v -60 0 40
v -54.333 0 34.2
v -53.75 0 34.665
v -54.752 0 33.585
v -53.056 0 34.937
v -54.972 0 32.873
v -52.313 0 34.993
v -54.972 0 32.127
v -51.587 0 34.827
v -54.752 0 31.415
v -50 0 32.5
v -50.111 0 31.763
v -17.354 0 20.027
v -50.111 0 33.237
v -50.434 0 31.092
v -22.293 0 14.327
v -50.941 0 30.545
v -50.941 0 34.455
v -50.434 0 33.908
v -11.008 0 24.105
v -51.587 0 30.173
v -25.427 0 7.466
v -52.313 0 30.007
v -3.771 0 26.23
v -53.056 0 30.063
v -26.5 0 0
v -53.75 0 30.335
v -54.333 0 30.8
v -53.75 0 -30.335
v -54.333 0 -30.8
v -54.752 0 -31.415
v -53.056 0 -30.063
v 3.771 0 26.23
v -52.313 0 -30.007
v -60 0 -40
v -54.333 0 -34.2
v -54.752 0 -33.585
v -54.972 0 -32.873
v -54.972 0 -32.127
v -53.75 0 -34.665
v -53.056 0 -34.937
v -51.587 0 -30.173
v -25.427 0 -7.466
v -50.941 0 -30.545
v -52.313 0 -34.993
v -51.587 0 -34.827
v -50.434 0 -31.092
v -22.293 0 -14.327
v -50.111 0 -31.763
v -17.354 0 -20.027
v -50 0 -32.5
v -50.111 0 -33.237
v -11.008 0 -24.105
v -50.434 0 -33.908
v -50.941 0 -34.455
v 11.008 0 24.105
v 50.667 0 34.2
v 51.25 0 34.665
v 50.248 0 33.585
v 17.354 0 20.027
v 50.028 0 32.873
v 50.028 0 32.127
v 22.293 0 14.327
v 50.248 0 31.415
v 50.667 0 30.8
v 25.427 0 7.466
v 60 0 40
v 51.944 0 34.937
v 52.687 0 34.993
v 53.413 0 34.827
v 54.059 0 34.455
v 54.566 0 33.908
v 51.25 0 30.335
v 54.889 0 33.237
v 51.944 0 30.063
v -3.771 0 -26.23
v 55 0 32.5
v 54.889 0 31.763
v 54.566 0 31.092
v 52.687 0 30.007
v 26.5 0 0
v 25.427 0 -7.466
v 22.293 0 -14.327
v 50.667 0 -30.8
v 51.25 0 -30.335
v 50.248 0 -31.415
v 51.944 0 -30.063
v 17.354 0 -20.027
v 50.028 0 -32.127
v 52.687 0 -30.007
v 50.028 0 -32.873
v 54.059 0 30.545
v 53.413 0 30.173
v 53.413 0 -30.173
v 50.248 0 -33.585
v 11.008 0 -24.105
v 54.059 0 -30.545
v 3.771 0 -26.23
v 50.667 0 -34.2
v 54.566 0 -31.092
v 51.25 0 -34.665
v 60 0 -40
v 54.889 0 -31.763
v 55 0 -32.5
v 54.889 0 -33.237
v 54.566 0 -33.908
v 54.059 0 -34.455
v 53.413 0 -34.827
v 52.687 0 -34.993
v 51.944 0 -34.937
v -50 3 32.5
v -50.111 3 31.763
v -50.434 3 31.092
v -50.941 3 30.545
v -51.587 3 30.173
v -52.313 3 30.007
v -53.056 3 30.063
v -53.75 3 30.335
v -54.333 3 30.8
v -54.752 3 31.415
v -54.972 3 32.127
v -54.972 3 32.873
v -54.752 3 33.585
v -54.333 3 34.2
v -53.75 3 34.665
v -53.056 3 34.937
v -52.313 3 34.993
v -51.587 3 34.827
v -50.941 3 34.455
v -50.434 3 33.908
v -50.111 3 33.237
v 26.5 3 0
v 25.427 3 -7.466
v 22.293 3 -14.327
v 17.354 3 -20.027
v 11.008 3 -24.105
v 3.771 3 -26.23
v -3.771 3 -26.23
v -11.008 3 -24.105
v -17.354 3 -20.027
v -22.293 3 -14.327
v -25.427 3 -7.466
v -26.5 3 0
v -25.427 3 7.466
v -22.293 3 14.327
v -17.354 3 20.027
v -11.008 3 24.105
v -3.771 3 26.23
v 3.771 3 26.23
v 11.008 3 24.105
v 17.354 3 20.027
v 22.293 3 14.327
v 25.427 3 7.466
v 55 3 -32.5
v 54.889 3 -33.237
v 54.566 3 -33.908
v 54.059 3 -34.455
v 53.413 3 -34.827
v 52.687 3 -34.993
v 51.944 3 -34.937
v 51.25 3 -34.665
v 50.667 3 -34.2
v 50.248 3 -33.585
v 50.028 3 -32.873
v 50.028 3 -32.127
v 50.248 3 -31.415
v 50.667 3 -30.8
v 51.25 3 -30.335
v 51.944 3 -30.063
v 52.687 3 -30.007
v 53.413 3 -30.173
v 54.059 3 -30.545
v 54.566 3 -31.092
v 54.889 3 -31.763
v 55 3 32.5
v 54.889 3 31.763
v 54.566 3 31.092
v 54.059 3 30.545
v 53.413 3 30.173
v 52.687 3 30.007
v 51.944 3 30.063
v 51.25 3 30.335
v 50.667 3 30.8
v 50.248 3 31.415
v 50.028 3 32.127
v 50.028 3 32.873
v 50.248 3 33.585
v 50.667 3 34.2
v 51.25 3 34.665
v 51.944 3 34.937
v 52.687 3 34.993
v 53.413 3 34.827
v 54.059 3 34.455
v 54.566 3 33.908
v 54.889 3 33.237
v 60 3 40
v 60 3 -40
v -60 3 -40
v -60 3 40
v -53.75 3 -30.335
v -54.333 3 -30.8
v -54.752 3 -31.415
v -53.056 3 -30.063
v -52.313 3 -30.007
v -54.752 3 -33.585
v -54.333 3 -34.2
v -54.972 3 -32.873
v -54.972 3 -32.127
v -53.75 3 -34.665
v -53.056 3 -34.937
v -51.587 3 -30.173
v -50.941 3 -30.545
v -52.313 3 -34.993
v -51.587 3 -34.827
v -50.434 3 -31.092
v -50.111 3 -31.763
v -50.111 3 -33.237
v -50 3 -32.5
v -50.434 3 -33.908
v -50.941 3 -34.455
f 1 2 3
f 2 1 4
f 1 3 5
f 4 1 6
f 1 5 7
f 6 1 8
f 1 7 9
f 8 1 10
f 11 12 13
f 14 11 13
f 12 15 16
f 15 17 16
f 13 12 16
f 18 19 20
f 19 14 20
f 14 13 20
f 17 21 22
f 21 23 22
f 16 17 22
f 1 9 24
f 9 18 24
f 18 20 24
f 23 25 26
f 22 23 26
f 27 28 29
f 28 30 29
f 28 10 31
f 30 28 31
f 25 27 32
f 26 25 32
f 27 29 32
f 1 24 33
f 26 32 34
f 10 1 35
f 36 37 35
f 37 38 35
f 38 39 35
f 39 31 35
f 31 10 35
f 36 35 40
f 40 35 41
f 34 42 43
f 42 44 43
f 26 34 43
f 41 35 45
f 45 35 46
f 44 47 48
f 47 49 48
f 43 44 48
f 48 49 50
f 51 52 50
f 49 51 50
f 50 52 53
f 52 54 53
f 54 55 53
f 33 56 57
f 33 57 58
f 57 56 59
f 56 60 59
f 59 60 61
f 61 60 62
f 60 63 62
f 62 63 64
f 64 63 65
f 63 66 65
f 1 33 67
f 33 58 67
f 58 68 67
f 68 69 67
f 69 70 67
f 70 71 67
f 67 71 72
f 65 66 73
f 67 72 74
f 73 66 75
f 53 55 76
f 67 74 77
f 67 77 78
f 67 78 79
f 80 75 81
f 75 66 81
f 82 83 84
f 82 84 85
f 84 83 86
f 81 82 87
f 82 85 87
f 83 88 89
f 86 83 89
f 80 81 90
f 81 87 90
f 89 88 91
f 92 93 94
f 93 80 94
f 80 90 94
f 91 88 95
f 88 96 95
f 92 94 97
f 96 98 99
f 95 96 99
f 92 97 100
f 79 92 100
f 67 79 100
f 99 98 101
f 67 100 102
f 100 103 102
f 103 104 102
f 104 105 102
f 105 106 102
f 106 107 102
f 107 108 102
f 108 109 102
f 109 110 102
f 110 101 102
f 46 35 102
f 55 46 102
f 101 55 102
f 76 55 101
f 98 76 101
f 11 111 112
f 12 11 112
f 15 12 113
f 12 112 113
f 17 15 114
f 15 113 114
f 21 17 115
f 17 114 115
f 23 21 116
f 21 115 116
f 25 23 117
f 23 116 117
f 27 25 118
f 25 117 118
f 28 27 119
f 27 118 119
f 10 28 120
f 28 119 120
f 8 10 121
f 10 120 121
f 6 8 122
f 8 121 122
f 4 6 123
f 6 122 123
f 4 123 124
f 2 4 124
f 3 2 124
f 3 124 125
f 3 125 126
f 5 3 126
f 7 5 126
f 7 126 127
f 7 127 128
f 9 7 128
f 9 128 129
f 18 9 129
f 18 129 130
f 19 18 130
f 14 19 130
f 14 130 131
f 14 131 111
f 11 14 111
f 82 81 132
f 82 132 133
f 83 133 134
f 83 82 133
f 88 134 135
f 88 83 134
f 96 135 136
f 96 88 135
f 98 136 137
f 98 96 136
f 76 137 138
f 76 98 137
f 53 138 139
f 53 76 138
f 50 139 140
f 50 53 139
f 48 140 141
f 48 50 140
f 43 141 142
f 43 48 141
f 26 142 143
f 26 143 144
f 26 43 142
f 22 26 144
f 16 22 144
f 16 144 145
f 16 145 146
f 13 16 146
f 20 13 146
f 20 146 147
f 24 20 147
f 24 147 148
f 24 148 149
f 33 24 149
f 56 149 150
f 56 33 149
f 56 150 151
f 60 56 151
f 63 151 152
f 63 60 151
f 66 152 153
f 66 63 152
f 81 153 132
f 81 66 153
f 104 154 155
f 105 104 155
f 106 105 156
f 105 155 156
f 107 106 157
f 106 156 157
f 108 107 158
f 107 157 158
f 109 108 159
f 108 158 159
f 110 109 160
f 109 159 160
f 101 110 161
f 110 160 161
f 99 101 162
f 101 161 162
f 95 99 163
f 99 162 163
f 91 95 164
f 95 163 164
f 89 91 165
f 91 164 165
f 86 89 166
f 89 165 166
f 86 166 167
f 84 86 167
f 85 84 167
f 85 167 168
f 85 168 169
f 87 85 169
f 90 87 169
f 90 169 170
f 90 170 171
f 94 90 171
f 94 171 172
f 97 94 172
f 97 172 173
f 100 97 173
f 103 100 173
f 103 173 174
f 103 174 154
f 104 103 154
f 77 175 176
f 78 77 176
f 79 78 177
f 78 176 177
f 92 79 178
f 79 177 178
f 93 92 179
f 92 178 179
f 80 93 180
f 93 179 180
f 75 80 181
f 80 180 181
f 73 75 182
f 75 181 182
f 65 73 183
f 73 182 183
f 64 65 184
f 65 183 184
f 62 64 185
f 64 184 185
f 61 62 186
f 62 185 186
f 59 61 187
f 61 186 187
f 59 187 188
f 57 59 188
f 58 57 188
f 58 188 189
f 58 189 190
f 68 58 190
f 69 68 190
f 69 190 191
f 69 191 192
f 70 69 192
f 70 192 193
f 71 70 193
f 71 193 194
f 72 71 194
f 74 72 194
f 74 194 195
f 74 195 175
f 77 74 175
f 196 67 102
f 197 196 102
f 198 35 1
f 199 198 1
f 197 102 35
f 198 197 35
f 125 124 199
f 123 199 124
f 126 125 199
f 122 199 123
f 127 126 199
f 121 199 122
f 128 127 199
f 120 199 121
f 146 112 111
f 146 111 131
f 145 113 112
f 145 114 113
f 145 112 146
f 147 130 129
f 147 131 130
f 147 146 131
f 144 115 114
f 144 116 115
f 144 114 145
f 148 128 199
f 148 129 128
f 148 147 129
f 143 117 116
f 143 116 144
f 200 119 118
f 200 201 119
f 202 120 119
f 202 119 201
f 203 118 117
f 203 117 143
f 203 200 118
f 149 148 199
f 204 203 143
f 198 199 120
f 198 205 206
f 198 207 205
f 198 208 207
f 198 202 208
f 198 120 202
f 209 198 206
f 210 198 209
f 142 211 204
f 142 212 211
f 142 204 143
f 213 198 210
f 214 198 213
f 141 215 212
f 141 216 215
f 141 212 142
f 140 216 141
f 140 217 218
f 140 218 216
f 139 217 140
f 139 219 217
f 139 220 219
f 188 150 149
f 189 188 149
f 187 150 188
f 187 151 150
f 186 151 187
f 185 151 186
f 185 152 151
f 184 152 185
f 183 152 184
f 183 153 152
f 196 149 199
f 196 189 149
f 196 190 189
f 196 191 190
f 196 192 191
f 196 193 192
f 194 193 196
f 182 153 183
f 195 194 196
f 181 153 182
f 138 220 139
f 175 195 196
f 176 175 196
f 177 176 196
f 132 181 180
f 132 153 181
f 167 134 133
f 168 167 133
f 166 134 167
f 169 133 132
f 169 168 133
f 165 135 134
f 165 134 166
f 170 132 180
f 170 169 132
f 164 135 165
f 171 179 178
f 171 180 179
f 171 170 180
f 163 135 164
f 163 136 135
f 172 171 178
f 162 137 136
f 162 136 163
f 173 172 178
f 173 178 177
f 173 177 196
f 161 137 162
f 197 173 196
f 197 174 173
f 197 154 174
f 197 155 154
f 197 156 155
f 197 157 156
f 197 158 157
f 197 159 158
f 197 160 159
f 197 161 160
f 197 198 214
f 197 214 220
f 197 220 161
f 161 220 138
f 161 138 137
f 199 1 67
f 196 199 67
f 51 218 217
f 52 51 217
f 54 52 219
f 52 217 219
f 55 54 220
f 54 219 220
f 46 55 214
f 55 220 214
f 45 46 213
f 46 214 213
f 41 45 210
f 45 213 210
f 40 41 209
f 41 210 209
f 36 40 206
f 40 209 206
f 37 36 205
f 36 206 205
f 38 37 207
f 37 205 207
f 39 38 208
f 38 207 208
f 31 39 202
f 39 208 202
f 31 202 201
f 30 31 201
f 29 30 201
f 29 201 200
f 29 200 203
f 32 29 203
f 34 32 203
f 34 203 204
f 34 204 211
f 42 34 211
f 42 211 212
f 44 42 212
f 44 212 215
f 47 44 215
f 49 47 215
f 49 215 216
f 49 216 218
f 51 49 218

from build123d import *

# Parameters (mm, degrees)
SKETCH1_R                       = 26.5
SKETCH1_W                       = 15
SKETCH1_H                       = 15
BOSS_EXTRUDE1_DEPTH             = 3
TAP_DRILL_FOR_M6X1_0_TAP1_D     = 5
TAP_DRILL_FOR_M6X1_0_TAP1_DEPTH = 3


with BuildPart() as part:
    # Sketch1 → Boss-Extrude1 (new body)
    with BuildSketch(Plane(origin=(0, 0, 0), x_dir=(1, 0, 0), z_dir=(0, 1, 0))):
        Polygon((45, 40), (-45, 40), (-45, 25), (-60, 25), (-60, -25), (-45, -25), (-45, -40), (45, -40), (45, -25), (60, -25), (60, 25), (45, 25), align=None)
        Circle(SKETCH1_R, mode=Mode.SUBTRACT)
        with Locations((52.5, -32.5)):
            Rectangle(SKETCH1_W, SKETCH1_H)
        with Locations((52.5, 32.5)):
            Rectangle(SKETCH1_W, SKETCH1_H)
        with Locations((-52.5, 32.5)):
            Rectangle(SKETCH1_W, SKETCH1_H)
        with Locations((-52.5, -32.5)):
            Rectangle(SKETCH1_W, SKETCH1_H)
    extrude(amount=BOSS_EXTRUDE1_DEPTH)

    # Tap Drill for M6x1.0 Tap1
    with Locations(Plane(origin=(0, 0, 0), x_dir=(-1, 0, 0), z_dir=(0, -1, 0))):
        with Locations((52.5, -32.5), (-52.5, -32.5), (-52.5, 32.5), (52.5, 32.5)):
            Hole(TAP_DRILL_FOR_M6X1_0_TAP1_D / 2, depth=TAP_DRILL_FOR_M6X1_0_TAP1_DEPTH)


solid = part.part
